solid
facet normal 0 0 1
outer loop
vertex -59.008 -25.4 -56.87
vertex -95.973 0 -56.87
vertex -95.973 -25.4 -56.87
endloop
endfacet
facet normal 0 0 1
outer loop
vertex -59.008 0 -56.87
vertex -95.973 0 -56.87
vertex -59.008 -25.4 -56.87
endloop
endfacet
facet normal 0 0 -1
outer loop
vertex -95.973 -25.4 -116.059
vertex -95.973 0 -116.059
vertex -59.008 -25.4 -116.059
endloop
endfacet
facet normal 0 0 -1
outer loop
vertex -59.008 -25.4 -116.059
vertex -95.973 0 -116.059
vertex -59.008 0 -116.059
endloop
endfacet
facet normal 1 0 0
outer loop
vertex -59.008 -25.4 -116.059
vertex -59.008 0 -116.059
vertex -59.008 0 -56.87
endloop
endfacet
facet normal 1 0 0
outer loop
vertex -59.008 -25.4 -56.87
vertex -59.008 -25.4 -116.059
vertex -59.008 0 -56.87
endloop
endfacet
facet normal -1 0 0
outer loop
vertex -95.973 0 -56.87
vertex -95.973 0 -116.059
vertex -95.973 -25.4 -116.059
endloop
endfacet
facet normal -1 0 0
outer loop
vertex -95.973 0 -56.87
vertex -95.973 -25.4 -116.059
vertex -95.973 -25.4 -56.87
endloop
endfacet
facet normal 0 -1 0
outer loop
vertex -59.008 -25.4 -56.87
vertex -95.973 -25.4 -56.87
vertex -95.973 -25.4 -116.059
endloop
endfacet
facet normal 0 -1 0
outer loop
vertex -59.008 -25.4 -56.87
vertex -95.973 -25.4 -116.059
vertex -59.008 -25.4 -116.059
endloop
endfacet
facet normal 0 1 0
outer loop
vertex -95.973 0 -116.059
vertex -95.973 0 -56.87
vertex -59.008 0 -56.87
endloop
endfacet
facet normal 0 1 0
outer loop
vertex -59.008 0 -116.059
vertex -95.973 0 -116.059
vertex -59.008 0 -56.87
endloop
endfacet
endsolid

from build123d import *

# Parameters (mm, degrees)
F0_W     = 79.0167599916
F0_H     = 16.8677717447
F1_DEPTH = 25.4
F0_W_2   = 19.6694098413
F0_H_2   = 41.121551767
F0_W_3   = 34.9301528186
F0_H_3   = 109.2894896865
F0_W_4   = 36.9649194181
F0_H_4   = 59.1894388199


with BuildPart() as f1:
    # F0 (on Front) → F1 (new body)
    with BuildSketch(Plane.XZ):
        with Locations((-127.3424550891, 41.0692133009)):
            Rectangle(F0_W, F0_H)
    extrude(amount=F1_DEPTH)


with BuildPart() as f1b:
    # F0 (on Front) → F1, piece 2 (new body)
    with BuildSketch(Plane.XZ):
        with Locations((-37.3040493578, 48.2394723222)):
            Rectangle(F0_W_2, F0_H_2)
    extrude(amount=F1_DEPTH)


with BuildPart() as f1c:
    # F0 (on Front) → F1, piece 3 (new body)
    with BuildSketch(Plane.XZ):
        with Locations((23.5693762079, 3.0734874308)):
            Rectangle(F0_W_3, F0_H_3)
    extrude(amount=F1_DEPTH)


with BuildPart() as f1d:
    # F0 (on Front) → F1, piece 4 (new body)
    with BuildSketch(Plane.XZ):
        with Locations((-77.4906817824, -86.4647701383)):
            Rectangle(F0_W_4, F0_H_4)
    extrude(amount=F1_DEPTH)


solid = f1d.part
